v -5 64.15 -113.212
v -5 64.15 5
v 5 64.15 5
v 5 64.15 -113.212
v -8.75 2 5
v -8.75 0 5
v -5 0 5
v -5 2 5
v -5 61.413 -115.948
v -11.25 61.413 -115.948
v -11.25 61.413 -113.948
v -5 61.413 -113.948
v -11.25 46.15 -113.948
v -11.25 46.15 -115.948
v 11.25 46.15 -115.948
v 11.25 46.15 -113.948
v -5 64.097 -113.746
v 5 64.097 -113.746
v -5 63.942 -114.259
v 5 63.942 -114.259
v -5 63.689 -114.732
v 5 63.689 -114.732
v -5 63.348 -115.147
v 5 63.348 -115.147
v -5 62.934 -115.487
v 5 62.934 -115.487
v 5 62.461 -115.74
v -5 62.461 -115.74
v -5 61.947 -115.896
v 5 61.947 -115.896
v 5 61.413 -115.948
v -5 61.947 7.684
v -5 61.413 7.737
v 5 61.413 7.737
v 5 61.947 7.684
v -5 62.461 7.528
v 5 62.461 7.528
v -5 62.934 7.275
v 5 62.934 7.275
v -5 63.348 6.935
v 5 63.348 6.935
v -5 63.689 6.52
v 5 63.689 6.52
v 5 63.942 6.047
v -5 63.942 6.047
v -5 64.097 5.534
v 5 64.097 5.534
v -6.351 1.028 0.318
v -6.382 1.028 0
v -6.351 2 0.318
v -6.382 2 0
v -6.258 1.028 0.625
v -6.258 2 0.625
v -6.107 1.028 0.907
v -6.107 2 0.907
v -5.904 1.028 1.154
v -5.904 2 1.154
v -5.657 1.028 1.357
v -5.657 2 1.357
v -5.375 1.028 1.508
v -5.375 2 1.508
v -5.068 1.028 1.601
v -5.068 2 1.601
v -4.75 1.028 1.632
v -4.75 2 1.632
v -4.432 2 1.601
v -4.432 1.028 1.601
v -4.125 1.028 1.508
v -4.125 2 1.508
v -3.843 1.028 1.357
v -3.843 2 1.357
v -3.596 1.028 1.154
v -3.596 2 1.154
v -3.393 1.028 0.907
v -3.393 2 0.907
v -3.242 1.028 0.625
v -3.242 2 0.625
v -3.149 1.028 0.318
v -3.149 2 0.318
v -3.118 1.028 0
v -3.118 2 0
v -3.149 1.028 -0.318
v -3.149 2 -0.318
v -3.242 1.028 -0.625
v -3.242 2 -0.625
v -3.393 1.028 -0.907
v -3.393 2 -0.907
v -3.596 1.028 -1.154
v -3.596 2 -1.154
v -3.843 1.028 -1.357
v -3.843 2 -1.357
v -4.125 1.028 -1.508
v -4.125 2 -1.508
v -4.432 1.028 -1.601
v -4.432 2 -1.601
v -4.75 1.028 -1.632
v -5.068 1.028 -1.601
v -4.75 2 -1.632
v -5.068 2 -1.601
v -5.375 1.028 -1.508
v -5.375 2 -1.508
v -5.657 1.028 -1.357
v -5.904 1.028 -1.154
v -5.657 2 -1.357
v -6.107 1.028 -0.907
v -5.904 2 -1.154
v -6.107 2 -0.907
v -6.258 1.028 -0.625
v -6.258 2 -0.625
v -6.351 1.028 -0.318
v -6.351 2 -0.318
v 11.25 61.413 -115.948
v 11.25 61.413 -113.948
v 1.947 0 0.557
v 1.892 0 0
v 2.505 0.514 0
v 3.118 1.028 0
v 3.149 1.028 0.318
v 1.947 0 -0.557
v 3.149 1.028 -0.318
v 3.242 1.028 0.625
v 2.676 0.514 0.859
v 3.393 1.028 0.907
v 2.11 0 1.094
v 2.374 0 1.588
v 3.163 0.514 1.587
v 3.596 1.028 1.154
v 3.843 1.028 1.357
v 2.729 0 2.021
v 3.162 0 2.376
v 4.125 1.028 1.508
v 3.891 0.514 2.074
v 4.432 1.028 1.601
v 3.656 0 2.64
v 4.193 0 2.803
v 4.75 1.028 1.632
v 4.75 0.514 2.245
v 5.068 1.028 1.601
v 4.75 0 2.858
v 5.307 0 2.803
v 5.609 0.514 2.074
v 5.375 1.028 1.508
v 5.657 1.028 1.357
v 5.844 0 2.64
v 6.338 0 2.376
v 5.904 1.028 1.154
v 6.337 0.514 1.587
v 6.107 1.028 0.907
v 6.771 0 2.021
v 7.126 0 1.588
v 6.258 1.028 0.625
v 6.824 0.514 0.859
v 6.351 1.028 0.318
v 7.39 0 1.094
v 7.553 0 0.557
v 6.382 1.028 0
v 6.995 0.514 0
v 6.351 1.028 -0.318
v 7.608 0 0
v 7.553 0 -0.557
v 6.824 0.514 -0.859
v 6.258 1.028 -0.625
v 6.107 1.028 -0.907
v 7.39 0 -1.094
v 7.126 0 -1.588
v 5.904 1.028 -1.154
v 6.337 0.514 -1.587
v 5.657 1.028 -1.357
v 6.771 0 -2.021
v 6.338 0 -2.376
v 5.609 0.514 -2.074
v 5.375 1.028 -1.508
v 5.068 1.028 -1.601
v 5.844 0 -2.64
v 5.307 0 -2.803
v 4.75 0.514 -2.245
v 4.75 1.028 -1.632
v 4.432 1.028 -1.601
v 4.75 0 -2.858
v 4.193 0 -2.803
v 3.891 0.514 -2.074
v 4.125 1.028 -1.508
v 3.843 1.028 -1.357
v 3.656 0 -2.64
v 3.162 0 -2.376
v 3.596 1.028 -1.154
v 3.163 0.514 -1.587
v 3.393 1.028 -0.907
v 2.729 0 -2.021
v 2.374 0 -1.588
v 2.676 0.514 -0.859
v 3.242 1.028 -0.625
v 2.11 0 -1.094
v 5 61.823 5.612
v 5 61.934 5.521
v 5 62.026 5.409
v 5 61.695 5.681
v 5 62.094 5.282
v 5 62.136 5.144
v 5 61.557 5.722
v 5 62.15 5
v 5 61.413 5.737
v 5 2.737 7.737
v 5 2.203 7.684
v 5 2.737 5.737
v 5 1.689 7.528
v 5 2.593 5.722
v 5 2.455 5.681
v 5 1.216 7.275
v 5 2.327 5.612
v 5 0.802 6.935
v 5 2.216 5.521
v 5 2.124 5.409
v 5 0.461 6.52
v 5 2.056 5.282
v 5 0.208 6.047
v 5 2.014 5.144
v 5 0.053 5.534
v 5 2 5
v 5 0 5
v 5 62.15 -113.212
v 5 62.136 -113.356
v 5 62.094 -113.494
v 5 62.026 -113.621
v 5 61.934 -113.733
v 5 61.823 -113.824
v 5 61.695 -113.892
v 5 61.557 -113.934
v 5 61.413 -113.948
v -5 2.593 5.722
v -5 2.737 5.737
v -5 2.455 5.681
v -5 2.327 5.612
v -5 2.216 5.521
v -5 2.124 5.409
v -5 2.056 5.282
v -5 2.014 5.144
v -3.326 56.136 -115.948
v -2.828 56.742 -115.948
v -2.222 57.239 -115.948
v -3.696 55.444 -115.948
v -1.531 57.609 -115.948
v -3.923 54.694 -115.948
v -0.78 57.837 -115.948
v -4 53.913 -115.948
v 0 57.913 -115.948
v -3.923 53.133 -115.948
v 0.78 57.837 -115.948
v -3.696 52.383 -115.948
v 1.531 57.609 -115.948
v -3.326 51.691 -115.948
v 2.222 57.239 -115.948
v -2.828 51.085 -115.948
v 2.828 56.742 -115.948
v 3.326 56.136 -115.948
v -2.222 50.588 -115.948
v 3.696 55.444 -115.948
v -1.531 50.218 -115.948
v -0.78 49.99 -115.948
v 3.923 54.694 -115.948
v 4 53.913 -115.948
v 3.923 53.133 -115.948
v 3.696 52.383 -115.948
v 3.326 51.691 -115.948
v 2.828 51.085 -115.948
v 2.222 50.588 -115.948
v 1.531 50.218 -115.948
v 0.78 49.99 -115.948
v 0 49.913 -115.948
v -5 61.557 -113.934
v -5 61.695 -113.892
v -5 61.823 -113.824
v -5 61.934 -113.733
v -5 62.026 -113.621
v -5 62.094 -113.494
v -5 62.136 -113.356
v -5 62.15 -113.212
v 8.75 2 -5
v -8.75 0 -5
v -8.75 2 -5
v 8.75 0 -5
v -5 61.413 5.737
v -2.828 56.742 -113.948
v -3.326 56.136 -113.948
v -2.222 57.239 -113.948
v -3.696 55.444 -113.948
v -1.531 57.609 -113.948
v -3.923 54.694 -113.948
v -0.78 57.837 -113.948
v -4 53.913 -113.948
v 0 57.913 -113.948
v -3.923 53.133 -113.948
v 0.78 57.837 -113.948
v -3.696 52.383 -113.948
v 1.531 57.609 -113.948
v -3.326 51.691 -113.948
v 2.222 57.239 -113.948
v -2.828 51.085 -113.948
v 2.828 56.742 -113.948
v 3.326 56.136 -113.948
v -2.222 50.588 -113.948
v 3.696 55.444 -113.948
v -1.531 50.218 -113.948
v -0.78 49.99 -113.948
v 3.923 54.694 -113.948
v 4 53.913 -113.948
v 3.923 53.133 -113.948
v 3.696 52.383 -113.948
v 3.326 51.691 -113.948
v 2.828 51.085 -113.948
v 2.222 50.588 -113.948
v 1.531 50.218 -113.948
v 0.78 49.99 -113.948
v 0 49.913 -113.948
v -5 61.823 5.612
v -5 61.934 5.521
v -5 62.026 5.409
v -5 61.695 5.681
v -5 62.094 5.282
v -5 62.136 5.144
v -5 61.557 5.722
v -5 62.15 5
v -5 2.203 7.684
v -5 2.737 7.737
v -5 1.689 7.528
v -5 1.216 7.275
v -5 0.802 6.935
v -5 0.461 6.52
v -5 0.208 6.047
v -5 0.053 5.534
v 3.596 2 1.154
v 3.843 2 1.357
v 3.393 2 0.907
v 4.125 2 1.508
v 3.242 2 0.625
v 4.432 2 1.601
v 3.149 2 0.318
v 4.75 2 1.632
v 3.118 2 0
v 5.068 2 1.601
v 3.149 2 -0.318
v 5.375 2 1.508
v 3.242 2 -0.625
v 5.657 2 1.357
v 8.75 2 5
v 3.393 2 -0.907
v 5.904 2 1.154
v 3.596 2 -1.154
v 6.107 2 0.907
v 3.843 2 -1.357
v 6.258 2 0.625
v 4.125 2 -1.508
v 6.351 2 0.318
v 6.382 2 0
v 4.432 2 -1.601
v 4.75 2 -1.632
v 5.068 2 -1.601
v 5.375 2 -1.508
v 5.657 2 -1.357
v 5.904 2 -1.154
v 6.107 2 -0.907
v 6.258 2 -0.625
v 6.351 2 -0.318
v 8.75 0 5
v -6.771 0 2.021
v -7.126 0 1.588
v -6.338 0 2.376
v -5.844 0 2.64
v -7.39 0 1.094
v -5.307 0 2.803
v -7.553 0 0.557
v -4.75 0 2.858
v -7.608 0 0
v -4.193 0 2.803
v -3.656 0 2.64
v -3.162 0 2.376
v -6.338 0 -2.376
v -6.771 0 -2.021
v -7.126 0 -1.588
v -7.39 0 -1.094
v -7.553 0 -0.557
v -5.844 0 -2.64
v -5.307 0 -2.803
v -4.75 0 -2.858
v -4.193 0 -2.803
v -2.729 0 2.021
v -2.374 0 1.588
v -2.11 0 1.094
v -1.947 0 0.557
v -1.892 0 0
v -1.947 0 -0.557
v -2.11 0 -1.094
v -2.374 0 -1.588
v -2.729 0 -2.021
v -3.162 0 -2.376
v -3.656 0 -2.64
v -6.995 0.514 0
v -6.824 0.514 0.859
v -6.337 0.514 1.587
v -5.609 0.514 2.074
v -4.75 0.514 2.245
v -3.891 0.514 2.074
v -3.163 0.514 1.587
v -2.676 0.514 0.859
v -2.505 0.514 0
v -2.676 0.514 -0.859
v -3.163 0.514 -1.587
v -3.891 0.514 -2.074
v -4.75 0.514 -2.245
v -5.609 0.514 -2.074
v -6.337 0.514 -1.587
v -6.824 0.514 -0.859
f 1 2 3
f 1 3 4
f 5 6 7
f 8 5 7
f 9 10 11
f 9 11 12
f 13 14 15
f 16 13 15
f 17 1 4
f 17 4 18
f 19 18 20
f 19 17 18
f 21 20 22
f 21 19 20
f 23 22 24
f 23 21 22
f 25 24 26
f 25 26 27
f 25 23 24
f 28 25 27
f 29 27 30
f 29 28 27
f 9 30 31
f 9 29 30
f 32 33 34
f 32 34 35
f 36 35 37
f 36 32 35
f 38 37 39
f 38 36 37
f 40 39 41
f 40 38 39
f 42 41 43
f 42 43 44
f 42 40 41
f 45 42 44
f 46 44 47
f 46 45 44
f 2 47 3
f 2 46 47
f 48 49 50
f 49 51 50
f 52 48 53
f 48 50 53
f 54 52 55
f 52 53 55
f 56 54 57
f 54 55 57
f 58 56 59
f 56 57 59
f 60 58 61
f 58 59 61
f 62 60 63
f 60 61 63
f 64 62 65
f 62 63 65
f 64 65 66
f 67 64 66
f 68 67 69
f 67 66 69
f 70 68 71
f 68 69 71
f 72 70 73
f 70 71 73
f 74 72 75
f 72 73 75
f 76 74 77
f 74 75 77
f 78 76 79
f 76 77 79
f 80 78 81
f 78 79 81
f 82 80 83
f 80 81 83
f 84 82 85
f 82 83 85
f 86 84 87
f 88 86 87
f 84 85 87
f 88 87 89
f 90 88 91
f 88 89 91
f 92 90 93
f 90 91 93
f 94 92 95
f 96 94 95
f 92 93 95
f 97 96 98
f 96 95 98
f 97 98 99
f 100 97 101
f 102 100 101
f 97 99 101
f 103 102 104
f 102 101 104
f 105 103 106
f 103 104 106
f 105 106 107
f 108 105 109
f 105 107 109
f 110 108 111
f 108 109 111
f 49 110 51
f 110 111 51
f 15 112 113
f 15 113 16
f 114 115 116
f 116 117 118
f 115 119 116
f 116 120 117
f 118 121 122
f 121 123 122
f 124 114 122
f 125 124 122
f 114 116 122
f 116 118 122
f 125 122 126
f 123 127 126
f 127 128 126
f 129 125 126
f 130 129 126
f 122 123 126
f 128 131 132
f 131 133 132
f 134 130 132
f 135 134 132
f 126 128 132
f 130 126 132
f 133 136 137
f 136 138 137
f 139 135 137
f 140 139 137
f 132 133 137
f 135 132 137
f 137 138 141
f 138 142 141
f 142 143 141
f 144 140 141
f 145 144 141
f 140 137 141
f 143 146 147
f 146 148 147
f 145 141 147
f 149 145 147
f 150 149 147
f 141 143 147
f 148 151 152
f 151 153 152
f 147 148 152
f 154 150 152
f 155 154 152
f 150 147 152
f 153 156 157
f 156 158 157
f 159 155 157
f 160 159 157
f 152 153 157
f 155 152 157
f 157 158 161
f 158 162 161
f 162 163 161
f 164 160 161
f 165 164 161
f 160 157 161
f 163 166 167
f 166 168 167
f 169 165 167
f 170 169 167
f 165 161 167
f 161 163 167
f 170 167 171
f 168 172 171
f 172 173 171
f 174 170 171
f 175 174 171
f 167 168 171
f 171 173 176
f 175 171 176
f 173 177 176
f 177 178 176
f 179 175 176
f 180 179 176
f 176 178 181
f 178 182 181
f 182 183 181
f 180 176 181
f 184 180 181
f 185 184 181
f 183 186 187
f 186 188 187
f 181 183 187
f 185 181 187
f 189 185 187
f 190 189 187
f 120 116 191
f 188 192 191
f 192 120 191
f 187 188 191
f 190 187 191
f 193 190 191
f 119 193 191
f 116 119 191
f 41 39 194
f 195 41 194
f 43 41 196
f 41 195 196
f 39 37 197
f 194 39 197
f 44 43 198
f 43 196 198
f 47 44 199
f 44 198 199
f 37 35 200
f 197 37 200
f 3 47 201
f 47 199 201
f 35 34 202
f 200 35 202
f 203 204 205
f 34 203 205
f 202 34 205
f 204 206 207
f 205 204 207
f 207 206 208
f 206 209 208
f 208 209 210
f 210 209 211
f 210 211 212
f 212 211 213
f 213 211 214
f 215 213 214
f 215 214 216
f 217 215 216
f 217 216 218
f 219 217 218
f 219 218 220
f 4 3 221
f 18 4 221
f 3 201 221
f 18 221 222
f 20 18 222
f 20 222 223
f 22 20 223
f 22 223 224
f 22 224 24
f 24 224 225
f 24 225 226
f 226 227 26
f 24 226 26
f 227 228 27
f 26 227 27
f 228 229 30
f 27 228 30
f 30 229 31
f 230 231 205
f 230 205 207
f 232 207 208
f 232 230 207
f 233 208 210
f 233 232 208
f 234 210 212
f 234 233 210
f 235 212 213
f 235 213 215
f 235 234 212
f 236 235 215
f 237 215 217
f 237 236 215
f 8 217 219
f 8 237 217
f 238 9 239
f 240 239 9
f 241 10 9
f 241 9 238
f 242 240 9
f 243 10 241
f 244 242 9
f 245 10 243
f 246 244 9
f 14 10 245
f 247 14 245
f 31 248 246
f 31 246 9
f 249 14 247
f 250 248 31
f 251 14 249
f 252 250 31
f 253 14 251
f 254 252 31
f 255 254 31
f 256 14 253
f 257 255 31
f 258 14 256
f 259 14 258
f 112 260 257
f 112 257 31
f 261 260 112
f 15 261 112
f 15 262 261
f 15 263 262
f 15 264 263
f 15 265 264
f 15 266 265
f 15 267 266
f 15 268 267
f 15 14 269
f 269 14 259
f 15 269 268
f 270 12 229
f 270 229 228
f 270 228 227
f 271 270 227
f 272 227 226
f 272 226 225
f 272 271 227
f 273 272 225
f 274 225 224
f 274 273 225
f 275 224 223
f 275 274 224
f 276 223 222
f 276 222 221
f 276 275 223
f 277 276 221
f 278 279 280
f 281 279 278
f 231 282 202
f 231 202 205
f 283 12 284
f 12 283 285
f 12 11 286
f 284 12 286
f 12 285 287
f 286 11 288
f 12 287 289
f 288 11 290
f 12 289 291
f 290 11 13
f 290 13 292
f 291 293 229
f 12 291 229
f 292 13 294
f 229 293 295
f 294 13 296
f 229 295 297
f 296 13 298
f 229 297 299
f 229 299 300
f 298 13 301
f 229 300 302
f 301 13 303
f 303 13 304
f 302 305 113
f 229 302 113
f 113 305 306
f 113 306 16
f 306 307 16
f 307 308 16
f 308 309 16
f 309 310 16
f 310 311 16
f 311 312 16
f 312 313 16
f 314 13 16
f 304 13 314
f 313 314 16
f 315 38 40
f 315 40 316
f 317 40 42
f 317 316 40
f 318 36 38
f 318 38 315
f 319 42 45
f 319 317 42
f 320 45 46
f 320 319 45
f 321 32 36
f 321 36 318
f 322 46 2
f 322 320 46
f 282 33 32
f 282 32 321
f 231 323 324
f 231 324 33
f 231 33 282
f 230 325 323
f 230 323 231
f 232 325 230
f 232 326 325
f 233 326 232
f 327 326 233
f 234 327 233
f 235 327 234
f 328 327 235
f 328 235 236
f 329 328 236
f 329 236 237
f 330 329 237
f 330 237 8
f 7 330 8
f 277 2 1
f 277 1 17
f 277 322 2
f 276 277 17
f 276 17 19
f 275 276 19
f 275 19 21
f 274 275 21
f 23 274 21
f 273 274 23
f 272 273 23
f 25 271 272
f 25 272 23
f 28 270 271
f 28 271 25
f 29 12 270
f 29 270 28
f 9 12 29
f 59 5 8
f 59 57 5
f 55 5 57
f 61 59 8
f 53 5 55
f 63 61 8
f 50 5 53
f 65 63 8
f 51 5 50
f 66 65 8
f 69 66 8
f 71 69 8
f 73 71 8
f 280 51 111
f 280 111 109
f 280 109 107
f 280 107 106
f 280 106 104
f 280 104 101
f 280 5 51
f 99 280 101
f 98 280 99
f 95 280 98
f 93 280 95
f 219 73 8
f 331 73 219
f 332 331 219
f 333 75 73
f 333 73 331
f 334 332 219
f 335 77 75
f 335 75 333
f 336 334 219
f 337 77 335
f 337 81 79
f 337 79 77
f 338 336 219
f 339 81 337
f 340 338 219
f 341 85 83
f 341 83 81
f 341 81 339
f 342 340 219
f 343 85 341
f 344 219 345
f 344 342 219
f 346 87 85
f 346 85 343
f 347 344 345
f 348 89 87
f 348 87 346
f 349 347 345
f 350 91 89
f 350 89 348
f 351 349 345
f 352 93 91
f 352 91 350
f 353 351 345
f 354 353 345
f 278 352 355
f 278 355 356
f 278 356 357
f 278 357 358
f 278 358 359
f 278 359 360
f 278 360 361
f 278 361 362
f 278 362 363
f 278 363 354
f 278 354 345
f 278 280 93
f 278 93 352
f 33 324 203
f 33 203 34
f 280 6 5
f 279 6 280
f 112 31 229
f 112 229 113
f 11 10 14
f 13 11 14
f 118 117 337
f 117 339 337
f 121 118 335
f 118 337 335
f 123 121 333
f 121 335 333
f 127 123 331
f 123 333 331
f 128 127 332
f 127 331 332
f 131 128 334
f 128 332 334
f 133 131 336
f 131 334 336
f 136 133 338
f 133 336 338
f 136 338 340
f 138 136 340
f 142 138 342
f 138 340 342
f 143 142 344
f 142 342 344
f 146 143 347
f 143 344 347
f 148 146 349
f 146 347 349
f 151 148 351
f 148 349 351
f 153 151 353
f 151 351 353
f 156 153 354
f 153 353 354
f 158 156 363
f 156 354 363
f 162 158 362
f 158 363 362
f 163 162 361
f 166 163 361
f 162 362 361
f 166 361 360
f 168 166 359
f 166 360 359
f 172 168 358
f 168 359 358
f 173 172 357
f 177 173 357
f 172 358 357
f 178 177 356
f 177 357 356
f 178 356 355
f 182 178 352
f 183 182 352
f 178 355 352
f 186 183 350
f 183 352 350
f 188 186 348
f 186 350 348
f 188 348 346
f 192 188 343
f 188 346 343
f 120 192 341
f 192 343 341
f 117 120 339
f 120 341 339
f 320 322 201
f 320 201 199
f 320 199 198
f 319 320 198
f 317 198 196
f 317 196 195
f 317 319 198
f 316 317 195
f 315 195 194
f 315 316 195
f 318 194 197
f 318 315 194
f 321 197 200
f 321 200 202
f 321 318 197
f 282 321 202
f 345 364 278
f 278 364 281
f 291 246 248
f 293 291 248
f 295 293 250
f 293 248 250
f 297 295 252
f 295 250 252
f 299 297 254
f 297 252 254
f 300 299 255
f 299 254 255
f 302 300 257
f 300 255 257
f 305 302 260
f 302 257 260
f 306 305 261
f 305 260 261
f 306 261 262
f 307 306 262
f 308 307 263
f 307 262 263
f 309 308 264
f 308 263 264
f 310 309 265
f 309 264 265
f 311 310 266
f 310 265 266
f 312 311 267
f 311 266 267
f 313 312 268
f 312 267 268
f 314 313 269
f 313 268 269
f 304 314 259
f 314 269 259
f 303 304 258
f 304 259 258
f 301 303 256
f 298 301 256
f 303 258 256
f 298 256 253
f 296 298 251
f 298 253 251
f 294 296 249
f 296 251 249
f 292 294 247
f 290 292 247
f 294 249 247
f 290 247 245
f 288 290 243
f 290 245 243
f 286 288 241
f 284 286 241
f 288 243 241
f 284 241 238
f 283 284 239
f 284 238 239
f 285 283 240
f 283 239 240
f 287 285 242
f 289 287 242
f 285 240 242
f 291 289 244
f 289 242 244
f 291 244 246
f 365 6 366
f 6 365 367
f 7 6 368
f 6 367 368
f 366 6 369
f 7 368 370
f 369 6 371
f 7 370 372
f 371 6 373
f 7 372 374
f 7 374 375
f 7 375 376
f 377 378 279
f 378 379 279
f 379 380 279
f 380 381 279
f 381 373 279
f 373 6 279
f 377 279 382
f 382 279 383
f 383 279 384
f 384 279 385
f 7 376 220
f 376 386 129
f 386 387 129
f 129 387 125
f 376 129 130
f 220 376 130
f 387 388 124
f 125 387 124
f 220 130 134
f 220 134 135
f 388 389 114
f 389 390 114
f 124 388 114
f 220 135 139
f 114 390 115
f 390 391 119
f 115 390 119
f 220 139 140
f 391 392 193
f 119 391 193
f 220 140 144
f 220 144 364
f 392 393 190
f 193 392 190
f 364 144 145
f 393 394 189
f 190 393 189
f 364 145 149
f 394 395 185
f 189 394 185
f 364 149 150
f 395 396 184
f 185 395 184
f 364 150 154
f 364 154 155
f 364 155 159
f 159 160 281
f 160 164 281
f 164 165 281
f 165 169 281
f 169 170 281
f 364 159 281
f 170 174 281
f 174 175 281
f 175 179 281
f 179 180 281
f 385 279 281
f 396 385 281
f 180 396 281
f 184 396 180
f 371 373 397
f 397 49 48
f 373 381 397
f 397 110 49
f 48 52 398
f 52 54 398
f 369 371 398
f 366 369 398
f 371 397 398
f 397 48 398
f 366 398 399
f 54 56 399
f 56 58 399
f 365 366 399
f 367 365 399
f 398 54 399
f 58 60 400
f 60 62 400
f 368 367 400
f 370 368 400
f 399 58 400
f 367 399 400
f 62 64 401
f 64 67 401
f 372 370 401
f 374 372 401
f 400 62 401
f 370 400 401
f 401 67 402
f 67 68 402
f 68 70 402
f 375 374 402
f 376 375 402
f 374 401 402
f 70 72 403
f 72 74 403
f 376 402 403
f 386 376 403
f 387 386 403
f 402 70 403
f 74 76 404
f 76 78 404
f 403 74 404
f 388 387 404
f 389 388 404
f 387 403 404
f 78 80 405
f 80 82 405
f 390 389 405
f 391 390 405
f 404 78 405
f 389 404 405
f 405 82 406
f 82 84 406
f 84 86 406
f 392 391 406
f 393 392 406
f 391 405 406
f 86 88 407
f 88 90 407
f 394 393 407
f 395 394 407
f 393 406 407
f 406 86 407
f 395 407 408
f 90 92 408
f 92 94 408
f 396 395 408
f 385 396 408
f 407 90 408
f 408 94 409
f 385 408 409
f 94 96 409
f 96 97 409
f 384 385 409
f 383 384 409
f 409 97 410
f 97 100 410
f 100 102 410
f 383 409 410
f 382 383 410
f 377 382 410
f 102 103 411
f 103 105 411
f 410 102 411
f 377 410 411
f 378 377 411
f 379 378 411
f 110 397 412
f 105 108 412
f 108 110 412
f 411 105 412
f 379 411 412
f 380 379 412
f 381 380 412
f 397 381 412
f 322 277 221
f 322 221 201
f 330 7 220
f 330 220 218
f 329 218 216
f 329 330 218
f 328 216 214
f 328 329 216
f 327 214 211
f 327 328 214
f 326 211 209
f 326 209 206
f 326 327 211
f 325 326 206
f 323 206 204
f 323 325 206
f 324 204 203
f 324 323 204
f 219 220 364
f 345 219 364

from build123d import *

# Parameters (mm, degrees)
SKETCH1_W                                         = 17.5
SKETCH1_H                                         = 10
BASE_FLANGE1_DEPTH                                = 2
EDGE_FLANGE1_DEPTH                                = 10
EDGE_FLANGE2_STRIP_W                              = 9.4732
EDGE_FLANGE2_STRIP_H                              = 2
EDGE_FLANGE2_STRIP_CUT_DEPTH                      = 10
EDGE_FLANGE2_DEPTH                                = 10
EDGE_FLANGE3_STRIP_W                              = 9.4732
EDGE_FLANGE3_STRIP_H                              = 2
EDGE_FLANGE3_STRIP_CUT_DEPTH                      = 10
EDGE_FLANGE3_DEPTH                                = 10
EDGE_FLANGE3_PROFILE_W                            = 22.5
EDGE_FLANGE3_PROFILE_H                            = 15.2634
EDGE_FLANGE3_FLAT_DEPTH                           = 2
SKETCH18_R                                        = 4
CUT_EXTRUDE2_DEPTH                                = 2
CSK_FOR_4_FLAT_HEAD_MACHINE_SCREW_100_D           = 3.2639
CSK_FOR_4_FLAT_HEAD_MACHINE_SCREW_100_DEPTH       = 2
CSK_FOR_4_FLAT_HEAD_MACHINE_SCREW_100_CSINK_D     = 5.715
CSK_FOR_4_FLAT_HEAD_MACHINE_SCREW_100_CSINK_ANGLE = 100
CSK_FOR_4_FLAT_HEAD_MACHINE_SCREW_100_TIP         = 0.980574487


# Sheet-metal steps are written as plain solids
with BuildPart() as part:
    # Sketch1 → Base-Flange1 (new body)
    with BuildSketch(Plane(origin=(0, 0, 0), x_dir=(1, 0, 0), z_dir=(0, 1, 0))):
        Rectangle(SKETCH1_W, SKETCH1_H)
    extrude(amount=BASE_FLANGE1_DEPTH)

    # Edge-Flange1 section (across the edge) → Edge-Flange1 (add)
    with BuildSketch(Plane(origin=(-5, 2, 5.7366), x_dir=(0, 0, -1), z_dir=(1, 0, 0))):
        with BuildLine():
            Line((-2, 0.7366), (-2, 62.15))
            Line((-2, 62.15), (0, 62.15))
            Line((0, 62.15), (0, 0.7366))
            ThreePointArc((0, 0.7366), (0.215745145, 0.215745145), (0.7366, 0))
            Line((0.7366, 0), (0.7366, -2))
            ThreePointArc((0.7366, -2), (-1.198468417, -1.198468417), (-2, 0.7366))
        make_face()
    extrude(amount=EDGE_FLANGE1_DEPTH)

    # Edge-Flange2 strip (across the edge) → Edge-Flange2 strip cut (cut)
    with BuildSketch(Plane(origin=(-5, 64.15, 5.7366), x_dir=(0, -1, 0), z_dir=(1, 0, 0))):
        with Locations((-2, -1)):
            Rectangle(EDGE_FLANGE2_STRIP_W, EDGE_FLANGE2_STRIP_H)
    extrude(amount=EDGE_FLANGE2_STRIP_CUT_DEPTH, mode=Mode.SUBTRACT)

    # Edge-Flange2 section (across the edge) → Edge-Flange2 (add)
    with BuildSketch(Plane(origin=(-5, 64.15, 5.7366), x_dir=(0, -1, 0), z_dir=(1, 0, 0))):
        with BuildLine():
            Line((0, 0.7366), (0, 121.685))
            Line((0, 121.685), (2, 121.685))
            Line((2, 121.685), (2, 0.7366))
            ThreePointArc((2, 0.7366), (2.215745145, 0.215745145), (2.7366, 0))
            Line((2.7366, 0), (2.7366, -2))
            ThreePointArc((2.7366, -2), (0.801531583, -1.198468417), (0, 0.7366))
        make_face()
    extrude(amount=EDGE_FLANGE2_DEPTH)

    # Edge-Flange3 strip (across the edge) → Edge-Flange3 strip cut (cut)
    with BuildSketch(Plane(origin=(-5, 62.15, -115.9484), x_dir=(0, 0, 1), z_dir=(1, 0, 0))):
        with Locations((-2, -1)):
            Rectangle(EDGE_FLANGE3_STRIP_W, EDGE_FLANGE3_STRIP_H)
    extrude(amount=EDGE_FLANGE3_STRIP_CUT_DEPTH, mode=Mode.SUBTRACT)

    # Edge-Flange3 bend section (across the edge) → Edge-Flange3 (add)
    with BuildSketch(Plane(origin=(-5, 62.15, -115.9484), x_dir=(0, 0, 1), z_dir=(1, 0, 0))):
        with BuildLine():
            Line((0, 0.7366), (2, 0.7366))
            ThreePointArc((2, 0.7366), (2.215745145, 0.215745145), (2.7366, 0))
            Line((2.7366, 0), (2.7366, -2))
            ThreePointArc((2.7366, -2), (0.801531583, -1.198468417), (0, 0.7366))
        make_face()
    extrude(amount=EDGE_FLANGE3_DEPTH)

    # Edge-Flange3 profile (on flange) → Edge-Flange3 flat (add)
    with BuildSketch(Plane(origin=(0, 62.15, -115.9484), x_dir=(1, 0, 0), z_dir=(0, 0, -1))):
        with Locations((0, 8.3683)):
            Rectangle(EDGE_FLANGE3_PROFILE_W, EDGE_FLANGE3_PROFILE_H)
    extrude(amount=-EDGE_FLANGE3_FLAT_DEPTH)

    # Sketch18 → Cut-Extrude2 (cut)
    with BuildSketch(Plane(origin=(0, 0, -115.9484), x_dir=(-1, 0, 0), z_dir=(0, 0, -1))):
        with Locations(Location((0, 53.9134, 0), (0, 0, 90))):
            Circle(SKETCH18_R)
    extrude(amount=-CUT_EXTRUDE2_DEPTH, mode=Mode.SUBTRACT)

    # CSK for #4 Flat Head Machine Screw (100)1
    with Locations(Plane.XZ):
        with Locations((4.75, 0), (-4.75, 0)):
            CounterSinkHole(CSK_FOR_4_FLAT_HEAD_MACHINE_SCREW_100_D / 2, CSK_FOR_4_FLAT_HEAD_MACHINE_SCREW_100_CSINK_D / 2, depth=CSK_FOR_4_FLAT_HEAD_MACHINE_SCREW_100_DEPTH, counter_sink_angle=CSK_FOR_4_FLAT_HEAD_MACHINE_SCREW_100_CSINK_ANGLE)
            with Locations((0, 0, -(CSK_FOR_4_FLAT_HEAD_MACHINE_SCREW_100_DEPTH + CSK_FOR_4_FLAT_HEAD_MACHINE_SCREW_100_TIP / 2))):  # 118° drill point
                Cone(0, CSK_FOR_4_FLAT_HEAD_MACHINE_SCREW_100_D / 2, CSK_FOR_4_FLAT_HEAD_MACHINE_SCREW_100_TIP, mode=Mode.SUBTRACT)


solid = part.part
